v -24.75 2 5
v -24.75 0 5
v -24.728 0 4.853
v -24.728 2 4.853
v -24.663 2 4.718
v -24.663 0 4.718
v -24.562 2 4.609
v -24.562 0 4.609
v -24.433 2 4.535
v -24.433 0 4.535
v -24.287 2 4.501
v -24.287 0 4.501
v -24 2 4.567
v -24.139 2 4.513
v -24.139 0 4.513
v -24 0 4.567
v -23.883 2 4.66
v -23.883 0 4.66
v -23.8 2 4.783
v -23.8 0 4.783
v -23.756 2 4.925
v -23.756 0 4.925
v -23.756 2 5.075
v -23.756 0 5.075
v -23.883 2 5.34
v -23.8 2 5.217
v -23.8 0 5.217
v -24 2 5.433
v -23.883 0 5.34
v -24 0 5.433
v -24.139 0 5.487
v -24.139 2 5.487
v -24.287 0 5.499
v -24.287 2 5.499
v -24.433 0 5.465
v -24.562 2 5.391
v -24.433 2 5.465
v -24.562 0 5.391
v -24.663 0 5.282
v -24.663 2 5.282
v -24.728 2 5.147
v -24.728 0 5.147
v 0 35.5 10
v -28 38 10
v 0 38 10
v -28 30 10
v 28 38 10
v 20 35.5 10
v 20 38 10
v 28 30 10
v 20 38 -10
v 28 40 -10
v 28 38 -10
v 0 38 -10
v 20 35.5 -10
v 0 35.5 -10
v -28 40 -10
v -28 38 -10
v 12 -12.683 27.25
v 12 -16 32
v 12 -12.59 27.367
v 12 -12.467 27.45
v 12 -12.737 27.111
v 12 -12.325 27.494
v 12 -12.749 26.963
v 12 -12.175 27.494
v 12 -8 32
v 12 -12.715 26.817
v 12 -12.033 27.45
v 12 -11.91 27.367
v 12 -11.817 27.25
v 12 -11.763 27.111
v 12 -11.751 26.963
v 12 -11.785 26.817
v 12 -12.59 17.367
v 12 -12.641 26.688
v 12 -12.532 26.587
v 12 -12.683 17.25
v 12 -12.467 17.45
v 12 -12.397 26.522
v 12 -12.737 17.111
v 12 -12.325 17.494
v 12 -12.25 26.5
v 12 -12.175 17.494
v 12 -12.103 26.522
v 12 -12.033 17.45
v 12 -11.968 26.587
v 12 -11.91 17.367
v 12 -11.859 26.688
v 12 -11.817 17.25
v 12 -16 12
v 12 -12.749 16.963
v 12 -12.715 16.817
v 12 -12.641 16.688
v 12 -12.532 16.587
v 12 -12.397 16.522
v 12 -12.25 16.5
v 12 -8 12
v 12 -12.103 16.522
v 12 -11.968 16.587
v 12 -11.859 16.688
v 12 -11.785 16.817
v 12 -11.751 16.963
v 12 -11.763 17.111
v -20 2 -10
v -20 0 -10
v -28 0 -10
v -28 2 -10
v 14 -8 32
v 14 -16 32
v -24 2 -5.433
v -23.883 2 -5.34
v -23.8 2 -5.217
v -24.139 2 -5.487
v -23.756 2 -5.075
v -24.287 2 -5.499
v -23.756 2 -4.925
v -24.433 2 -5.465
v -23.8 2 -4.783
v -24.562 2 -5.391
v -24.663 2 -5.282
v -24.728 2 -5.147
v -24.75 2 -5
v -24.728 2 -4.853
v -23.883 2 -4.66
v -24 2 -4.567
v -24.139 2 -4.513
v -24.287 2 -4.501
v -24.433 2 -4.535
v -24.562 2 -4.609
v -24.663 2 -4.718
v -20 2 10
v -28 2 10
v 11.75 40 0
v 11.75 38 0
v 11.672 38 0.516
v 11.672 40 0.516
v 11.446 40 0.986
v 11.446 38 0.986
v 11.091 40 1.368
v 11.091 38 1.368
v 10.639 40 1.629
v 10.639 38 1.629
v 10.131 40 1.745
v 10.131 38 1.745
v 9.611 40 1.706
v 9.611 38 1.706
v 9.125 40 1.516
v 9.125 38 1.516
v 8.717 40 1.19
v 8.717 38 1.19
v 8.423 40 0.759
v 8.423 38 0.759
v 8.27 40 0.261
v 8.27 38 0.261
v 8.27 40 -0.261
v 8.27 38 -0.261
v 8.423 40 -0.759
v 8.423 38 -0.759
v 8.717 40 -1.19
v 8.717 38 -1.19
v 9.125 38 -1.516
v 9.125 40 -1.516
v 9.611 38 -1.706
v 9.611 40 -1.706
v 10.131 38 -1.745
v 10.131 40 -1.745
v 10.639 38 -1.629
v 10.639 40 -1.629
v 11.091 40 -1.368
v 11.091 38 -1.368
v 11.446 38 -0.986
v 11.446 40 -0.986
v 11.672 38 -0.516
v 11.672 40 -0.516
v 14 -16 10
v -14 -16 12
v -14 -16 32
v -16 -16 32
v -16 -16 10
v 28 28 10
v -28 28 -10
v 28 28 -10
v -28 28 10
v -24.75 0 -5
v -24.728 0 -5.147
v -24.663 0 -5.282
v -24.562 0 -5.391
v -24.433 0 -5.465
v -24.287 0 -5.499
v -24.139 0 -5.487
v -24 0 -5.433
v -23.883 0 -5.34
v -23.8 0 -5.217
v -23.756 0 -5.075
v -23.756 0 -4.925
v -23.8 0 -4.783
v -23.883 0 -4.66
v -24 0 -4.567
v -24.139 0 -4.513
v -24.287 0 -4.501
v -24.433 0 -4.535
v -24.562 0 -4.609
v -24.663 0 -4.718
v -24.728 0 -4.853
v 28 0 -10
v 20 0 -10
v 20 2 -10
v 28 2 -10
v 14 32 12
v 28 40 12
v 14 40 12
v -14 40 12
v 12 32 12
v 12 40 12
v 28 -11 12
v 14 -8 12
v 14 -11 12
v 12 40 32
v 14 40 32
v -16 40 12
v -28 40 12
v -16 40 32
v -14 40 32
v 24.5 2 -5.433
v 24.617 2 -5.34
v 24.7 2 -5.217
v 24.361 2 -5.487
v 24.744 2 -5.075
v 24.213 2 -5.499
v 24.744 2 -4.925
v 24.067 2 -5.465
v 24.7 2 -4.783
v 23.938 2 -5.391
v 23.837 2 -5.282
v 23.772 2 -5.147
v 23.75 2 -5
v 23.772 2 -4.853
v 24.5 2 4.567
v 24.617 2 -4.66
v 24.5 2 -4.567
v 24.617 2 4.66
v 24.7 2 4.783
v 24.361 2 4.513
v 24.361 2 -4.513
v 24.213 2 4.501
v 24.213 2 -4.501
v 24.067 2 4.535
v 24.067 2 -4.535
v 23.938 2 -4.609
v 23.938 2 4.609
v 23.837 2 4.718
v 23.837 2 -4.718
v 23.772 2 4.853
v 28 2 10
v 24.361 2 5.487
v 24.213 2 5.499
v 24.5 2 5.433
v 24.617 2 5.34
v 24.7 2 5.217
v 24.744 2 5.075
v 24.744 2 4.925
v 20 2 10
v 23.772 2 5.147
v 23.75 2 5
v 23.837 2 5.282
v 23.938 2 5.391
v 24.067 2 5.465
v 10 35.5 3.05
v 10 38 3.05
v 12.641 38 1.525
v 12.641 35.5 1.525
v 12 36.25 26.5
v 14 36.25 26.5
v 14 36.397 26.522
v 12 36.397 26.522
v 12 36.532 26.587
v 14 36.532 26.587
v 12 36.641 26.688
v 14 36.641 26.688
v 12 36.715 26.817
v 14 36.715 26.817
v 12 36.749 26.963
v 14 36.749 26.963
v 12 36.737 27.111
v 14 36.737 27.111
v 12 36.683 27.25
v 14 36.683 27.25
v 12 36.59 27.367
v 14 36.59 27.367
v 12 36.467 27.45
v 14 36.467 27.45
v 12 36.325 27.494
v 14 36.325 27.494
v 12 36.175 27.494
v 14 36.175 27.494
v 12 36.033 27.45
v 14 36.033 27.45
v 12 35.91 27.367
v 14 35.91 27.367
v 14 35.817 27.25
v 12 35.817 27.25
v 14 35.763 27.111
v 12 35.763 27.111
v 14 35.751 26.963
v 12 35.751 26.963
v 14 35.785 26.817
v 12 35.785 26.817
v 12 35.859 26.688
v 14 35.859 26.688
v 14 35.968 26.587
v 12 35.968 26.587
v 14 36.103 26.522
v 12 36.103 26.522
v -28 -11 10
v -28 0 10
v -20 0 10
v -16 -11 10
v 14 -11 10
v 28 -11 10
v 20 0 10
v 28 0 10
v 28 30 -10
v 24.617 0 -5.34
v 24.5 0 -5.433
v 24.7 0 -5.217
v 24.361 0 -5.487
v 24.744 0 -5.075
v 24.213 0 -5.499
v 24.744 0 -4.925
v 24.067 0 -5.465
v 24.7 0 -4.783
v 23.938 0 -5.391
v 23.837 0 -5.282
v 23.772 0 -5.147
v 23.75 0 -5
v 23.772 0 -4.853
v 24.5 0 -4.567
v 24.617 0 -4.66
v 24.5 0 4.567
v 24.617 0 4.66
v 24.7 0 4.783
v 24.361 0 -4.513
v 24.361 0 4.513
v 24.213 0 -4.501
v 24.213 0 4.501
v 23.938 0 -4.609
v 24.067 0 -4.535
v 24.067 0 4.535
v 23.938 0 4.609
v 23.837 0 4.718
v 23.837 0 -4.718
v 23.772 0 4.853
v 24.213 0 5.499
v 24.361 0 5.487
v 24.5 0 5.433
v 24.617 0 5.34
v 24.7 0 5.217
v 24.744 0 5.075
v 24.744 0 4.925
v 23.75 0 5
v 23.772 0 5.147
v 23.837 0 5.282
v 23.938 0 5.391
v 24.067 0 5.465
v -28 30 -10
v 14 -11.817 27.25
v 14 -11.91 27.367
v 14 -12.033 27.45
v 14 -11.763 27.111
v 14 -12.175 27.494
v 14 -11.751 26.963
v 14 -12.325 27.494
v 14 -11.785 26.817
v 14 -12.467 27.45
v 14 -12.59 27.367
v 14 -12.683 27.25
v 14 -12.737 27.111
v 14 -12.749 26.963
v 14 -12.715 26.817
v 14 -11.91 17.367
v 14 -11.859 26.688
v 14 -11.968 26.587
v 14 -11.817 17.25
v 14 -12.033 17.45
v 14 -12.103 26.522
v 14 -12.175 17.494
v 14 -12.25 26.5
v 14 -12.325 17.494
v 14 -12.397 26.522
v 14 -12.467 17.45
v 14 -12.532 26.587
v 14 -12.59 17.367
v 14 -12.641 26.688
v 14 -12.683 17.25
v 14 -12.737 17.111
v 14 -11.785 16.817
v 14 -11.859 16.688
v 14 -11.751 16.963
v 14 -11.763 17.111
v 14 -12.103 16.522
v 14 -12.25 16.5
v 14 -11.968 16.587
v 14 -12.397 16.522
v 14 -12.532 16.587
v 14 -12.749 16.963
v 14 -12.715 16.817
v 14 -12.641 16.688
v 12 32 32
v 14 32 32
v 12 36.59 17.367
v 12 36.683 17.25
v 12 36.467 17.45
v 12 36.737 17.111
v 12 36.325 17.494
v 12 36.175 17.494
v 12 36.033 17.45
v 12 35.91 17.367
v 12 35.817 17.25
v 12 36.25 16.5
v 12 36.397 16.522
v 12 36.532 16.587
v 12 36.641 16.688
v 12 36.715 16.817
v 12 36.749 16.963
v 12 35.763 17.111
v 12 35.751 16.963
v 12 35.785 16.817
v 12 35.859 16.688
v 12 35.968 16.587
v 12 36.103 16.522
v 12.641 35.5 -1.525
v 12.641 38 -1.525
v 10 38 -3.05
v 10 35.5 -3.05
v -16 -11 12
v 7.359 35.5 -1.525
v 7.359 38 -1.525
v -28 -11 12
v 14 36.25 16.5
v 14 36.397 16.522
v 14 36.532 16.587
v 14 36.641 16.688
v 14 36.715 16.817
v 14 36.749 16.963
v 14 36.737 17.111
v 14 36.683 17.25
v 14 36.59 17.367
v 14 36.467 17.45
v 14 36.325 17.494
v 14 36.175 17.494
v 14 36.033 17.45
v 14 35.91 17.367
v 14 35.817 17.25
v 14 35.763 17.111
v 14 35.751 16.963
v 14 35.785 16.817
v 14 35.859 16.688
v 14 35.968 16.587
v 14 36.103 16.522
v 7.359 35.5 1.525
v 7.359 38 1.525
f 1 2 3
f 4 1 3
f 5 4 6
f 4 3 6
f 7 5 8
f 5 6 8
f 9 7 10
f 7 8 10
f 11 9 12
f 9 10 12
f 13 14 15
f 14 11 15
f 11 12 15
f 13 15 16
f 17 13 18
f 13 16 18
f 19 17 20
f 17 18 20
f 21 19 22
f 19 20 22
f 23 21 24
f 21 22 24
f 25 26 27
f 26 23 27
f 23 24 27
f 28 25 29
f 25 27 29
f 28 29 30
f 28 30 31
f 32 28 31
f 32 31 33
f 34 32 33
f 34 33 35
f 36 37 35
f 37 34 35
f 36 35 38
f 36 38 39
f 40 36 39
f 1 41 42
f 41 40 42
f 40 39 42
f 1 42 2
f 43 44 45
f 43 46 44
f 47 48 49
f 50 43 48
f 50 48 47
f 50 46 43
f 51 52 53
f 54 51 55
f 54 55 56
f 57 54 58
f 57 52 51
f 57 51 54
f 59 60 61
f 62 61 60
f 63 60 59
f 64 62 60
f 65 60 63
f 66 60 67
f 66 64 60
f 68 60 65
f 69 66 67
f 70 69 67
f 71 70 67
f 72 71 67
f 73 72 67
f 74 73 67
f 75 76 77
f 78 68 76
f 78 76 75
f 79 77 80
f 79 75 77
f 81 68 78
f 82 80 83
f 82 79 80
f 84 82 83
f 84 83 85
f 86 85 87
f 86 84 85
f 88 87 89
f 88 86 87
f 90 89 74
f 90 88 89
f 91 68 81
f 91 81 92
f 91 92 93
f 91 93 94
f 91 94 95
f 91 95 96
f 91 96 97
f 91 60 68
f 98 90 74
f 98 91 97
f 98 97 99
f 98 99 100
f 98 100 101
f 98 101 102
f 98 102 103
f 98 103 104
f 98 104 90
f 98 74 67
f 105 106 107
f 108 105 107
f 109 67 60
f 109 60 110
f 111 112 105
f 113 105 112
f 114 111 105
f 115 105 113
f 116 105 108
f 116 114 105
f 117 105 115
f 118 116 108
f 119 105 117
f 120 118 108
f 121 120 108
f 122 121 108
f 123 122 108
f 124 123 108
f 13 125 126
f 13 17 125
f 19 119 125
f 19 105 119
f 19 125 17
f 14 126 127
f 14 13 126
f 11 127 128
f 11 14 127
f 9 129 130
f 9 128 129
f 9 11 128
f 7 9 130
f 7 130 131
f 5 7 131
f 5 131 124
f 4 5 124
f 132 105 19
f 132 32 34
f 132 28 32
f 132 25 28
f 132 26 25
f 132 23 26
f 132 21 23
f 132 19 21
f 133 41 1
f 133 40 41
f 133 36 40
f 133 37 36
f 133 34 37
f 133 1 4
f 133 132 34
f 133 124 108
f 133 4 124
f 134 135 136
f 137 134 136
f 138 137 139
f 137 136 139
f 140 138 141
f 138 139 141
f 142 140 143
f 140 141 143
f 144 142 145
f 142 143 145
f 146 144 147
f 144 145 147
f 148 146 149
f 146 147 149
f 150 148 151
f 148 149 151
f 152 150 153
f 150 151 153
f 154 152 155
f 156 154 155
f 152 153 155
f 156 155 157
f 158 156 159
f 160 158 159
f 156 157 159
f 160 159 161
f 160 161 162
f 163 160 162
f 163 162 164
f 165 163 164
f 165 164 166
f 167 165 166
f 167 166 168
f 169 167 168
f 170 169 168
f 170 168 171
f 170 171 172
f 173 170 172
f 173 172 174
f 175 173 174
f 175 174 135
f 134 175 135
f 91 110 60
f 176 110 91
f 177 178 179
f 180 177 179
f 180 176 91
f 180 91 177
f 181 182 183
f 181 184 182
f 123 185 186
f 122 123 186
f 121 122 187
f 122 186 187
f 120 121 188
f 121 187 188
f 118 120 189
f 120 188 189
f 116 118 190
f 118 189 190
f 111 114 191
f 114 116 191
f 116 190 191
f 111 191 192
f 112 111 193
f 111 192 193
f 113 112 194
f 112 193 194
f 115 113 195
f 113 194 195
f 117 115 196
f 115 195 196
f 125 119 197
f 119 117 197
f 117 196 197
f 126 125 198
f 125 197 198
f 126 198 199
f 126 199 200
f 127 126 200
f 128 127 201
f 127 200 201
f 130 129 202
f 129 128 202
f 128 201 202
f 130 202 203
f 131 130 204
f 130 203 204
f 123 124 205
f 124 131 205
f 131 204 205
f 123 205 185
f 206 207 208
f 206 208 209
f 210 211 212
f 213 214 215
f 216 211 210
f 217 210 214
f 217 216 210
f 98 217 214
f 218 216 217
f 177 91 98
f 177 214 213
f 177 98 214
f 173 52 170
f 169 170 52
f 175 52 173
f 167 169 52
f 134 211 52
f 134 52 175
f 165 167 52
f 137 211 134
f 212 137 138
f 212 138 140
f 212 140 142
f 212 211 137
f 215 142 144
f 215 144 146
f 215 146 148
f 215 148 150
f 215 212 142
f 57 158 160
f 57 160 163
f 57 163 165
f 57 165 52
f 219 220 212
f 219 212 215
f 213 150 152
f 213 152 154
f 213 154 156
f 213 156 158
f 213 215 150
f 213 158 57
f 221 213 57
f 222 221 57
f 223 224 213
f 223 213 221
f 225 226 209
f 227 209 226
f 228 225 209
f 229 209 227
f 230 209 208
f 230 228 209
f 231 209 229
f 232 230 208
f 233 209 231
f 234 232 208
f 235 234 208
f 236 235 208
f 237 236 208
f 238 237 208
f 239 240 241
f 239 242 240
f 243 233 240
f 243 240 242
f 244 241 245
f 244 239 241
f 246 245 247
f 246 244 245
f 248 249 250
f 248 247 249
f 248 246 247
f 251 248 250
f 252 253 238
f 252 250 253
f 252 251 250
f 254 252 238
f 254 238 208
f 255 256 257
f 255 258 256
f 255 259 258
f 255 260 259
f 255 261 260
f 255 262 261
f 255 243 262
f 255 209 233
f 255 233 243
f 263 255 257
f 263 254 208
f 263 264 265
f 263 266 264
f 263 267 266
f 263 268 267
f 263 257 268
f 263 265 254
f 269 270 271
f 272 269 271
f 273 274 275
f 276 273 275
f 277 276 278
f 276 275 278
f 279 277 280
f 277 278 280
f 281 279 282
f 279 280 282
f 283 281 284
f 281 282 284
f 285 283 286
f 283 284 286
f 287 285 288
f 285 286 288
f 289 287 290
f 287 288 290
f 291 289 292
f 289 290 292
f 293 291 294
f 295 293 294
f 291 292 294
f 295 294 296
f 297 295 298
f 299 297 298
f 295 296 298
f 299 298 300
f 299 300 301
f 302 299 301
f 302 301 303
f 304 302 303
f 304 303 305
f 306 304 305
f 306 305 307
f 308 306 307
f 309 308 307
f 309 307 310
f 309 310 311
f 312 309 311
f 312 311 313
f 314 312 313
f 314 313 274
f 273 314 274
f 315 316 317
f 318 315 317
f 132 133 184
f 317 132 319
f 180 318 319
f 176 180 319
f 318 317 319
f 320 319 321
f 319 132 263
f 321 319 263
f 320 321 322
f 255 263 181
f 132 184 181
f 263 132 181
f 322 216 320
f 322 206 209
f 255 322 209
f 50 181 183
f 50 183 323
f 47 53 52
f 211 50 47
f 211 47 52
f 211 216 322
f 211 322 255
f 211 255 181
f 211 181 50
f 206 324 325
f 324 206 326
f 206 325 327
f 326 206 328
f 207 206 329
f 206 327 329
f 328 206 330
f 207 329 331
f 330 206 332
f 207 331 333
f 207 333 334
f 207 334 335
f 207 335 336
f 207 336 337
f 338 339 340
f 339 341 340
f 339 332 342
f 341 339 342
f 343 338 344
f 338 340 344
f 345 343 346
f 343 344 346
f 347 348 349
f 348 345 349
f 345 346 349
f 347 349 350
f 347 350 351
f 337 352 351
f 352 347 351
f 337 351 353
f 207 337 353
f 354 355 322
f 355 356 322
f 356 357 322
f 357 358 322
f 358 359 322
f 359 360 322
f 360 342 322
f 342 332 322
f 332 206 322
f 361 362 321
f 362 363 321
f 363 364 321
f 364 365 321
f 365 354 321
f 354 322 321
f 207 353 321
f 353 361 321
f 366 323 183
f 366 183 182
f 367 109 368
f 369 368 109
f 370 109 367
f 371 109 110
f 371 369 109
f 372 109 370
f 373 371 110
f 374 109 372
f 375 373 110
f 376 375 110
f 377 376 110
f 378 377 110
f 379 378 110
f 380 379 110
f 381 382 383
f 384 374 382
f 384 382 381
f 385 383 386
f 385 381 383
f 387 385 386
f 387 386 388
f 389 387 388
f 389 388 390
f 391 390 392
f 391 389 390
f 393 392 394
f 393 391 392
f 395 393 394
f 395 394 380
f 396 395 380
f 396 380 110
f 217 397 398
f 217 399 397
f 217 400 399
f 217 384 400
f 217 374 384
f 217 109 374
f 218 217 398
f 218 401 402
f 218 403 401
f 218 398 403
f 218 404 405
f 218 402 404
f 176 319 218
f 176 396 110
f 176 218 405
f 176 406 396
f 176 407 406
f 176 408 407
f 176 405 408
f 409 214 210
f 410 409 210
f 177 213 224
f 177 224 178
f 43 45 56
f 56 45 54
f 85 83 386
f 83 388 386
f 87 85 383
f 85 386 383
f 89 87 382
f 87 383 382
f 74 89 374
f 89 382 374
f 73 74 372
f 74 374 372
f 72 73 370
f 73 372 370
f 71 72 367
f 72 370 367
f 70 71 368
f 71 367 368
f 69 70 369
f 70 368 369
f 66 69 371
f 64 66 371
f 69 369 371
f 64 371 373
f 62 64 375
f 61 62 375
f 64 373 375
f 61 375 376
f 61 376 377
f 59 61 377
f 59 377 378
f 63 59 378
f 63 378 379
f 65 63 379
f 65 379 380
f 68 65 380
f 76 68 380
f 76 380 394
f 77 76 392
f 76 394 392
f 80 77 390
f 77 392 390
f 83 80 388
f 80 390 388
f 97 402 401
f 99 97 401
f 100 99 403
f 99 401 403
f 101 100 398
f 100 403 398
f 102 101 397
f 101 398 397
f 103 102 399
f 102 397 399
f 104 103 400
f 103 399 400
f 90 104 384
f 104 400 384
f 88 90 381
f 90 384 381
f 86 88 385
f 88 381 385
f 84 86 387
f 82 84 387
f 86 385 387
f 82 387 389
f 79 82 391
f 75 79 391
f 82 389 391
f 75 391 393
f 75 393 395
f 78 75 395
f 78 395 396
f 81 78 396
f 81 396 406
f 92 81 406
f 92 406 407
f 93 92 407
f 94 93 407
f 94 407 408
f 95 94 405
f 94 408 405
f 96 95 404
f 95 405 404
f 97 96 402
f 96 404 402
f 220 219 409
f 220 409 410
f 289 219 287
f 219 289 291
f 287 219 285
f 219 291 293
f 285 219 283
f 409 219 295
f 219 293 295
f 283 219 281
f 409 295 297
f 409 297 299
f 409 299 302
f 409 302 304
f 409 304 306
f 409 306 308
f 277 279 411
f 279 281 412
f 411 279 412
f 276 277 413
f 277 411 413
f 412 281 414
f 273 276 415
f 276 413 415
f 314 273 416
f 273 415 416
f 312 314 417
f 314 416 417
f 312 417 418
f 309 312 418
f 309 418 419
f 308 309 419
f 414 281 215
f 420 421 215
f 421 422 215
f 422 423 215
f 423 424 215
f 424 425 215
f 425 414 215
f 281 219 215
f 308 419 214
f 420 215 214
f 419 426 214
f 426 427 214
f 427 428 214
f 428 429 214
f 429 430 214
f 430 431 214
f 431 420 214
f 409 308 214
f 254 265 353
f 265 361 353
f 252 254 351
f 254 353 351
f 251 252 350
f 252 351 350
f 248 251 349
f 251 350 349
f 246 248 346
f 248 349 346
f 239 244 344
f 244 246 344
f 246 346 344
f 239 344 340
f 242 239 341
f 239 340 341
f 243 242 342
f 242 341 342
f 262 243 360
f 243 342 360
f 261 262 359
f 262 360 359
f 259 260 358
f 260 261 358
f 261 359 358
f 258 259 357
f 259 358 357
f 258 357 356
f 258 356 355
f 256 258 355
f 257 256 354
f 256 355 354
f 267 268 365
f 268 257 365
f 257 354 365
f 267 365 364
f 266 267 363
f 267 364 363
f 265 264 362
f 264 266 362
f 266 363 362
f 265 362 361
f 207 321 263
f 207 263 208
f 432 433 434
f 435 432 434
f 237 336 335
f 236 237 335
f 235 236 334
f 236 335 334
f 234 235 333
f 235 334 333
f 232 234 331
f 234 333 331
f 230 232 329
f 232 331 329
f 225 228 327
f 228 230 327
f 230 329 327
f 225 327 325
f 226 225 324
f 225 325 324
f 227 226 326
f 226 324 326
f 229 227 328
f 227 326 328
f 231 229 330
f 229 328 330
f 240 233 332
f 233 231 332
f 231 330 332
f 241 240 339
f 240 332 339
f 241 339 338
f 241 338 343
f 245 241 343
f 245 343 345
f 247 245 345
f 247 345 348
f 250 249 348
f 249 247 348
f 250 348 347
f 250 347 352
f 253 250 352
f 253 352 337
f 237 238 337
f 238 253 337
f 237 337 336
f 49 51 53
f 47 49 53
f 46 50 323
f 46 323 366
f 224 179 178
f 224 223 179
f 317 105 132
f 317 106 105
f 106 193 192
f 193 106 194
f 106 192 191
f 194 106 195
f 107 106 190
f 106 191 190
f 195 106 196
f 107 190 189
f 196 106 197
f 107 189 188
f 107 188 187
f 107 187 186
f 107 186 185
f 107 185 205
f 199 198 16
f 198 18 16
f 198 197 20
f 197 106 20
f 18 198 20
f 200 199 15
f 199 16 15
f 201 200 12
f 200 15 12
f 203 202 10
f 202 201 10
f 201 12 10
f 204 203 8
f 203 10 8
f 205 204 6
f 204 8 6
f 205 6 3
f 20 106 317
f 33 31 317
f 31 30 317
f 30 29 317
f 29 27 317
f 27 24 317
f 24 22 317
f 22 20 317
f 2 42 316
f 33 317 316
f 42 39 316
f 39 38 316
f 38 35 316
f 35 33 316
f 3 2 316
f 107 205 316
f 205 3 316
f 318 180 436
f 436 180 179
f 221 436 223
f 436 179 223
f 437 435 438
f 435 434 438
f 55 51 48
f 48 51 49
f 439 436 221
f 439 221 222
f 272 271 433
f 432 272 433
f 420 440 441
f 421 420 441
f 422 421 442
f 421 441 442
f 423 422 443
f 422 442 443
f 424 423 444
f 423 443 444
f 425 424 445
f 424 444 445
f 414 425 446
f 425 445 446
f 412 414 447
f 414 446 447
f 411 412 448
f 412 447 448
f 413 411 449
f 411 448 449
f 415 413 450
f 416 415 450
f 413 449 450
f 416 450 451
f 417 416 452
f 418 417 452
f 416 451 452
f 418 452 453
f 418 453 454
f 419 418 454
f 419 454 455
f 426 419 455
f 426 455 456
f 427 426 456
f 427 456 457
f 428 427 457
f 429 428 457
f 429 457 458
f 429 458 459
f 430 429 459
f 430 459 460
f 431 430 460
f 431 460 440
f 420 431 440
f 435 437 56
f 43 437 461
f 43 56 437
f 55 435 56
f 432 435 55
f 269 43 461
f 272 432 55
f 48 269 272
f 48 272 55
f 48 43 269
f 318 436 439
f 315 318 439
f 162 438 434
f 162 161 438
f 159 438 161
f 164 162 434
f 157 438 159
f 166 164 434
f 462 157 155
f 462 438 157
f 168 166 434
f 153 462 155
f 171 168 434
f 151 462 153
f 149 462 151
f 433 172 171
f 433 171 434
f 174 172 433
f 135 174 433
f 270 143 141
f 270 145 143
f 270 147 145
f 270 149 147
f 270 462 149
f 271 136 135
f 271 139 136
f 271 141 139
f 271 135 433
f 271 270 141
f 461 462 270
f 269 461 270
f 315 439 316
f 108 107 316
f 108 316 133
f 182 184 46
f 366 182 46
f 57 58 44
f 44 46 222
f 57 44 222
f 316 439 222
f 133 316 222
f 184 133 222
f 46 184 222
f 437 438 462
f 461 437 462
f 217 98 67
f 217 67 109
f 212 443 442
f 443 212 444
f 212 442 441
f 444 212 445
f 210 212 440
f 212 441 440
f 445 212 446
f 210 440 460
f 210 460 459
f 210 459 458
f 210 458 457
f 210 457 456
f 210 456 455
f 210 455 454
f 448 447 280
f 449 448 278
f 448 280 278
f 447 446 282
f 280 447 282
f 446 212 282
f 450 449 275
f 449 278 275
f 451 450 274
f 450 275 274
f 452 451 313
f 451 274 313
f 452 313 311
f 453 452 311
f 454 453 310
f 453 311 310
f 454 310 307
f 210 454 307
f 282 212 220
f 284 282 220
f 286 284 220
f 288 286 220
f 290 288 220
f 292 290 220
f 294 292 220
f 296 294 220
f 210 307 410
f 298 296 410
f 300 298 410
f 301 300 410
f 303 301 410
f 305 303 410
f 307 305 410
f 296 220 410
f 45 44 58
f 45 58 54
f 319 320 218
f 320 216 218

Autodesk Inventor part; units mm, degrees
ref_plane "YZ Plane" through (0, 0, 0) normal (1, 0, 0) x (0, 1, 0)
ref_plane "XZ Plane" through (0, 0, 0) normal (0, 1, 0) x (-1, 0, 0)
ref_plane "XY Plane" through (0, 0, 0) normal (0, 0, 1) x (1, 0, 0)
sketch "Sketch1" plane through (0, 0, 0) normal (0, 1, 0) x (-1, 0, 0)
  line L0 (31, 0) -> (-47, 0) construction
  line L1 (0, 43) -> (0, -45) construction
  line L2 (20, 10) -> (-20, 10)
  line L3 (-20, 10) -> (-20, -10)
  line L4 (20, -10) -> (20, 10)
  line L5 (28, 12) -> (-28, 12)
  line L6 (-28, 12) -> (-28, -10)
  line L7 (28, -10) -> (28, 12)
  circle A0 centre (24.25, 5) radius 0.5
  line L8 (-20, -10) -> (-28, -10)
  line L9 (20, -10) -> (28, -10)
  circle A1 centre (24.25, -5) radius 0.5
  circle A2 centre (-24.25, 5) radius 0.5
  circle A3 centre (-24.25, -5) radius 0.5
  line L10 (-20, 10) -> (-28, 10)
  line L11 (20, 10) -> (28, 10)
  line L12 (-20, -10) -> (20, -10)
  point P0 (0, 0)
  dimension "d1" = 40
  dimension "d3" = 8
  dimension "d4" = 1
  dimension "d5" = 4.25
  dimension "d6" = 5
  dimension "d7" = 2
  dimension "d8" = 10
  dimension "d9" = 10
extrude "Extrusion1" add sketch "Sketch1" along normal blind 2 contours L11 L7 L9 L4 | L2 L10 L6 L5 L7 L11 | L3 L8 L6 L10
extrude "Extrusion2" add sketch "Sketch1" along normal blind 30 contours L2 L10 L6 L5 L7 L11
extrude "Extrusion3" add sketch "Sketch1" against normal blind 11 contours L2 L10 L6 L5 L7 L11
sketch "Sketch2" plane through (28, 0, 10) normal (0, 0, -1) x (-1, 0, 0)
  line L0 (0, 30) -> (56, 30) projected
  line L1 (56, 30) -> (56, 28)
  line L2 (56, -11) -> (56, 30) projected
  line L3 (56, 28) -> (0, 28)
  line L4 (0, 28) -> (0, 30)
  line L5 (0, 2) -> (0, 30) projected
  point P0 (28, 0)
  dimension "d18" = 2
extrude "Extrusion4" add sketch "Sketch2" along normal blind 20
sketch "Sketch4" plane through (-28, 30, 12) normal (0, 0, 1) x (1, 0, 0)
  line L0 (56, -41) -> (0, -41) construction
  line L1 (0, -41) -> (0, 0) construction
  line L2 (0, 0) -> (56, 0) construction
  line L3 (56, -41) -> (56, 0) construction
  line L4 (12, -46) -> (12, 10)
  line L5 (12, 10) -> (14, 10)
  line L6 (14, 10) -> (14, -46)
  line L7 (14, -46) -> (12, -46)
  line L8 (42, -46) -> (40, -46)
  line L9 (40, -46) -> (40, -38)
  line L10 (40, -38) -> (42, -38)
  line L11 (42, -38) -> (42, -46)
  line L12 (66, -18) -> (-18, -18) construction
  line L13 (42, 10) -> (40, 10)
  line L14 (40, 10) -> (40, 2)
  line L15 (40, 2) -> (42, 2)
  line L16 (42, 2) -> (42, 10)
  line L17 (42, -46) -> (12, -46)
  line L18 (12, -46) -> (12, 10)
  line L19 (12, 10) -> (42, 10)
  line L20 (42, 10) -> (42, -46)
  line L21 (0, 0) -> (2, 0)
  line L22 (2, 0) -> (2, -41)
  line L23 (2, -41) -> (0, -41)
  line L24 (0, -41) -> (0, 0)
  point P0 (28, -30)
  dimension "d32" = 2
  dimension "d33" = 12
  dimension "d35" = 56
  dimension "d36" = 2
  dimension "d37" = 8
  dimension "d38" = 3
  dimension "d39" = 28
  dimension "d52" = 2
extrude "Extrusion7" add sketch "Sketch4" along normal blind 20 contours L4 L5 L6 L7 | L9 L10 L11 L8 | L13 L16 L15 L14
extrude "Extrusion8" add sketch "Sketch4" against normal blind 2 contours L4 L5 L6 L7 | L6 L19 L14 L15 L20 L10 L9 L17 | L9 L10 L11 L8 | L13 L16 L15 L14
sketch "Sketch5" plane through (14, -11, 12) normal (1, 0, 0) x (0, 0, -1)
  line L0 (-20, -5) -> (-20, 3) construction
  line L1 (2, -5) -> (-20, -5) construction
  line L2 (-20, 3) -> (-20, 51) construction
  line L3 (-20, 51) -> (-20, 51) construction
  line L4 (-20, 51) -> (2, 51) construction
  circle A0 centre (-15, -1.25) radius 0.5
  line L5 (0, 3) -> (-20, 3) construction
  line L6 (0, -5) -> (0, 3) construction
  line L7 (-10, -8) -> (-10, 8) construction
  line L8 (8, 23) -> (-29, 23) construction
  circle A1 centre (-5, -1.25) radius 0.5
  circle A2 centre (-15, 47.25) radius 0.5
  circle A3 centre (-5, 47.25) radius 0.5
  point P0 (12, 11)
  dimension "d44" = 1
  dimension "d45" = 5
  dimension "d46" = 4.25
  dimension "d47" = 10
  dimension "d49" = 20
extrude "Extrusion9" cut sketch "Sketch5" against normal blind 6
sketch "Sketch6" plane through (0, 30, 0) normal (0, 1, 0) x (1, 0, 0)
  line L0 (28, -12) -> (-28, -12)
  line L1 (-28, -12) -> (-28, -10)
  line L2 (-28, -10) -> (28, -10)
  line L3 (28, -10) -> (28, -12)
  point P0 (0, 0)
extrude "Extrusion11" add sketch "Sketch6" along normal blind 10
sketch "Sketch7" plane through (-28, 30, 10) normal (0, 0, -1) x (-1, 0, 0)
  line L0 (0, 0) -> (0, 10) projected
  line L1 (-56, 10) -> (0, 10)
  line L2 (0, 10) -> (0, 8)
  line L3 (0, 8) -> (-56, 8)
  line L4 (-56, 8) -> (-56, 10)
  point P0 (-28, -30)
  dimension "d57" = 2
extrude "Extrusion12" add sketch "Sketch7" along normal blind 20
sketch "Sketch9" plane through (-28, 38, 10) normal (0, -1, 0) x (1, 0, 0)
  line L0 (56, 0) -> (56, -20) construction
  circle A0 centre (38, -10) radius 1.75
  line L1 (56, -20) -> (0, -20) construction
  line L2 (38, -13.05) -> (35.3586, -11.525)
  line L3 (35.3586, -11.525) -> (35.3586, -8.475)
  line L4 (35.3586, -8.475) -> (38, -6.95)
  line L5 (38, -6.95) -> (40.6414, -8.475)
  line L6 (40.6414, -8.475) -> (40.6414, -11.525)
  line L7 (40.6414, -11.525) -> (38, -13.05)
  line L8 (42, 0) -> (56, 0) projected
  line L9 (56, -20) -> (0, -20) projected
  line L10 (48, 0) -> (28, 0)
  line L11 (28, 0) -> (28, -20)
  line L12 (28, -20) -> (48, -20)
  line L13 (48, -20) -> (48, 0)
  line L14 (50, -10) -> (29, -10) construction
  line L15 (38, -1.4358) -> (38, -18.5642) construction
  point P0 (28, -10)
  dimension "d63" = 3.5
  dimension "d64" = 18
  dimension "d65" = 10
  dimension "d66" = 6.1
  dimension "d67" = 20
extrude "Extrusion13" add sketch "Sketch9" along normal blind 2.5 contours L8 L13 L9 L11 L10
extrude "Extrusion14" cut sketch "Sketch9" against normal blind 7.5 contours A0
properties part number "Joint"
